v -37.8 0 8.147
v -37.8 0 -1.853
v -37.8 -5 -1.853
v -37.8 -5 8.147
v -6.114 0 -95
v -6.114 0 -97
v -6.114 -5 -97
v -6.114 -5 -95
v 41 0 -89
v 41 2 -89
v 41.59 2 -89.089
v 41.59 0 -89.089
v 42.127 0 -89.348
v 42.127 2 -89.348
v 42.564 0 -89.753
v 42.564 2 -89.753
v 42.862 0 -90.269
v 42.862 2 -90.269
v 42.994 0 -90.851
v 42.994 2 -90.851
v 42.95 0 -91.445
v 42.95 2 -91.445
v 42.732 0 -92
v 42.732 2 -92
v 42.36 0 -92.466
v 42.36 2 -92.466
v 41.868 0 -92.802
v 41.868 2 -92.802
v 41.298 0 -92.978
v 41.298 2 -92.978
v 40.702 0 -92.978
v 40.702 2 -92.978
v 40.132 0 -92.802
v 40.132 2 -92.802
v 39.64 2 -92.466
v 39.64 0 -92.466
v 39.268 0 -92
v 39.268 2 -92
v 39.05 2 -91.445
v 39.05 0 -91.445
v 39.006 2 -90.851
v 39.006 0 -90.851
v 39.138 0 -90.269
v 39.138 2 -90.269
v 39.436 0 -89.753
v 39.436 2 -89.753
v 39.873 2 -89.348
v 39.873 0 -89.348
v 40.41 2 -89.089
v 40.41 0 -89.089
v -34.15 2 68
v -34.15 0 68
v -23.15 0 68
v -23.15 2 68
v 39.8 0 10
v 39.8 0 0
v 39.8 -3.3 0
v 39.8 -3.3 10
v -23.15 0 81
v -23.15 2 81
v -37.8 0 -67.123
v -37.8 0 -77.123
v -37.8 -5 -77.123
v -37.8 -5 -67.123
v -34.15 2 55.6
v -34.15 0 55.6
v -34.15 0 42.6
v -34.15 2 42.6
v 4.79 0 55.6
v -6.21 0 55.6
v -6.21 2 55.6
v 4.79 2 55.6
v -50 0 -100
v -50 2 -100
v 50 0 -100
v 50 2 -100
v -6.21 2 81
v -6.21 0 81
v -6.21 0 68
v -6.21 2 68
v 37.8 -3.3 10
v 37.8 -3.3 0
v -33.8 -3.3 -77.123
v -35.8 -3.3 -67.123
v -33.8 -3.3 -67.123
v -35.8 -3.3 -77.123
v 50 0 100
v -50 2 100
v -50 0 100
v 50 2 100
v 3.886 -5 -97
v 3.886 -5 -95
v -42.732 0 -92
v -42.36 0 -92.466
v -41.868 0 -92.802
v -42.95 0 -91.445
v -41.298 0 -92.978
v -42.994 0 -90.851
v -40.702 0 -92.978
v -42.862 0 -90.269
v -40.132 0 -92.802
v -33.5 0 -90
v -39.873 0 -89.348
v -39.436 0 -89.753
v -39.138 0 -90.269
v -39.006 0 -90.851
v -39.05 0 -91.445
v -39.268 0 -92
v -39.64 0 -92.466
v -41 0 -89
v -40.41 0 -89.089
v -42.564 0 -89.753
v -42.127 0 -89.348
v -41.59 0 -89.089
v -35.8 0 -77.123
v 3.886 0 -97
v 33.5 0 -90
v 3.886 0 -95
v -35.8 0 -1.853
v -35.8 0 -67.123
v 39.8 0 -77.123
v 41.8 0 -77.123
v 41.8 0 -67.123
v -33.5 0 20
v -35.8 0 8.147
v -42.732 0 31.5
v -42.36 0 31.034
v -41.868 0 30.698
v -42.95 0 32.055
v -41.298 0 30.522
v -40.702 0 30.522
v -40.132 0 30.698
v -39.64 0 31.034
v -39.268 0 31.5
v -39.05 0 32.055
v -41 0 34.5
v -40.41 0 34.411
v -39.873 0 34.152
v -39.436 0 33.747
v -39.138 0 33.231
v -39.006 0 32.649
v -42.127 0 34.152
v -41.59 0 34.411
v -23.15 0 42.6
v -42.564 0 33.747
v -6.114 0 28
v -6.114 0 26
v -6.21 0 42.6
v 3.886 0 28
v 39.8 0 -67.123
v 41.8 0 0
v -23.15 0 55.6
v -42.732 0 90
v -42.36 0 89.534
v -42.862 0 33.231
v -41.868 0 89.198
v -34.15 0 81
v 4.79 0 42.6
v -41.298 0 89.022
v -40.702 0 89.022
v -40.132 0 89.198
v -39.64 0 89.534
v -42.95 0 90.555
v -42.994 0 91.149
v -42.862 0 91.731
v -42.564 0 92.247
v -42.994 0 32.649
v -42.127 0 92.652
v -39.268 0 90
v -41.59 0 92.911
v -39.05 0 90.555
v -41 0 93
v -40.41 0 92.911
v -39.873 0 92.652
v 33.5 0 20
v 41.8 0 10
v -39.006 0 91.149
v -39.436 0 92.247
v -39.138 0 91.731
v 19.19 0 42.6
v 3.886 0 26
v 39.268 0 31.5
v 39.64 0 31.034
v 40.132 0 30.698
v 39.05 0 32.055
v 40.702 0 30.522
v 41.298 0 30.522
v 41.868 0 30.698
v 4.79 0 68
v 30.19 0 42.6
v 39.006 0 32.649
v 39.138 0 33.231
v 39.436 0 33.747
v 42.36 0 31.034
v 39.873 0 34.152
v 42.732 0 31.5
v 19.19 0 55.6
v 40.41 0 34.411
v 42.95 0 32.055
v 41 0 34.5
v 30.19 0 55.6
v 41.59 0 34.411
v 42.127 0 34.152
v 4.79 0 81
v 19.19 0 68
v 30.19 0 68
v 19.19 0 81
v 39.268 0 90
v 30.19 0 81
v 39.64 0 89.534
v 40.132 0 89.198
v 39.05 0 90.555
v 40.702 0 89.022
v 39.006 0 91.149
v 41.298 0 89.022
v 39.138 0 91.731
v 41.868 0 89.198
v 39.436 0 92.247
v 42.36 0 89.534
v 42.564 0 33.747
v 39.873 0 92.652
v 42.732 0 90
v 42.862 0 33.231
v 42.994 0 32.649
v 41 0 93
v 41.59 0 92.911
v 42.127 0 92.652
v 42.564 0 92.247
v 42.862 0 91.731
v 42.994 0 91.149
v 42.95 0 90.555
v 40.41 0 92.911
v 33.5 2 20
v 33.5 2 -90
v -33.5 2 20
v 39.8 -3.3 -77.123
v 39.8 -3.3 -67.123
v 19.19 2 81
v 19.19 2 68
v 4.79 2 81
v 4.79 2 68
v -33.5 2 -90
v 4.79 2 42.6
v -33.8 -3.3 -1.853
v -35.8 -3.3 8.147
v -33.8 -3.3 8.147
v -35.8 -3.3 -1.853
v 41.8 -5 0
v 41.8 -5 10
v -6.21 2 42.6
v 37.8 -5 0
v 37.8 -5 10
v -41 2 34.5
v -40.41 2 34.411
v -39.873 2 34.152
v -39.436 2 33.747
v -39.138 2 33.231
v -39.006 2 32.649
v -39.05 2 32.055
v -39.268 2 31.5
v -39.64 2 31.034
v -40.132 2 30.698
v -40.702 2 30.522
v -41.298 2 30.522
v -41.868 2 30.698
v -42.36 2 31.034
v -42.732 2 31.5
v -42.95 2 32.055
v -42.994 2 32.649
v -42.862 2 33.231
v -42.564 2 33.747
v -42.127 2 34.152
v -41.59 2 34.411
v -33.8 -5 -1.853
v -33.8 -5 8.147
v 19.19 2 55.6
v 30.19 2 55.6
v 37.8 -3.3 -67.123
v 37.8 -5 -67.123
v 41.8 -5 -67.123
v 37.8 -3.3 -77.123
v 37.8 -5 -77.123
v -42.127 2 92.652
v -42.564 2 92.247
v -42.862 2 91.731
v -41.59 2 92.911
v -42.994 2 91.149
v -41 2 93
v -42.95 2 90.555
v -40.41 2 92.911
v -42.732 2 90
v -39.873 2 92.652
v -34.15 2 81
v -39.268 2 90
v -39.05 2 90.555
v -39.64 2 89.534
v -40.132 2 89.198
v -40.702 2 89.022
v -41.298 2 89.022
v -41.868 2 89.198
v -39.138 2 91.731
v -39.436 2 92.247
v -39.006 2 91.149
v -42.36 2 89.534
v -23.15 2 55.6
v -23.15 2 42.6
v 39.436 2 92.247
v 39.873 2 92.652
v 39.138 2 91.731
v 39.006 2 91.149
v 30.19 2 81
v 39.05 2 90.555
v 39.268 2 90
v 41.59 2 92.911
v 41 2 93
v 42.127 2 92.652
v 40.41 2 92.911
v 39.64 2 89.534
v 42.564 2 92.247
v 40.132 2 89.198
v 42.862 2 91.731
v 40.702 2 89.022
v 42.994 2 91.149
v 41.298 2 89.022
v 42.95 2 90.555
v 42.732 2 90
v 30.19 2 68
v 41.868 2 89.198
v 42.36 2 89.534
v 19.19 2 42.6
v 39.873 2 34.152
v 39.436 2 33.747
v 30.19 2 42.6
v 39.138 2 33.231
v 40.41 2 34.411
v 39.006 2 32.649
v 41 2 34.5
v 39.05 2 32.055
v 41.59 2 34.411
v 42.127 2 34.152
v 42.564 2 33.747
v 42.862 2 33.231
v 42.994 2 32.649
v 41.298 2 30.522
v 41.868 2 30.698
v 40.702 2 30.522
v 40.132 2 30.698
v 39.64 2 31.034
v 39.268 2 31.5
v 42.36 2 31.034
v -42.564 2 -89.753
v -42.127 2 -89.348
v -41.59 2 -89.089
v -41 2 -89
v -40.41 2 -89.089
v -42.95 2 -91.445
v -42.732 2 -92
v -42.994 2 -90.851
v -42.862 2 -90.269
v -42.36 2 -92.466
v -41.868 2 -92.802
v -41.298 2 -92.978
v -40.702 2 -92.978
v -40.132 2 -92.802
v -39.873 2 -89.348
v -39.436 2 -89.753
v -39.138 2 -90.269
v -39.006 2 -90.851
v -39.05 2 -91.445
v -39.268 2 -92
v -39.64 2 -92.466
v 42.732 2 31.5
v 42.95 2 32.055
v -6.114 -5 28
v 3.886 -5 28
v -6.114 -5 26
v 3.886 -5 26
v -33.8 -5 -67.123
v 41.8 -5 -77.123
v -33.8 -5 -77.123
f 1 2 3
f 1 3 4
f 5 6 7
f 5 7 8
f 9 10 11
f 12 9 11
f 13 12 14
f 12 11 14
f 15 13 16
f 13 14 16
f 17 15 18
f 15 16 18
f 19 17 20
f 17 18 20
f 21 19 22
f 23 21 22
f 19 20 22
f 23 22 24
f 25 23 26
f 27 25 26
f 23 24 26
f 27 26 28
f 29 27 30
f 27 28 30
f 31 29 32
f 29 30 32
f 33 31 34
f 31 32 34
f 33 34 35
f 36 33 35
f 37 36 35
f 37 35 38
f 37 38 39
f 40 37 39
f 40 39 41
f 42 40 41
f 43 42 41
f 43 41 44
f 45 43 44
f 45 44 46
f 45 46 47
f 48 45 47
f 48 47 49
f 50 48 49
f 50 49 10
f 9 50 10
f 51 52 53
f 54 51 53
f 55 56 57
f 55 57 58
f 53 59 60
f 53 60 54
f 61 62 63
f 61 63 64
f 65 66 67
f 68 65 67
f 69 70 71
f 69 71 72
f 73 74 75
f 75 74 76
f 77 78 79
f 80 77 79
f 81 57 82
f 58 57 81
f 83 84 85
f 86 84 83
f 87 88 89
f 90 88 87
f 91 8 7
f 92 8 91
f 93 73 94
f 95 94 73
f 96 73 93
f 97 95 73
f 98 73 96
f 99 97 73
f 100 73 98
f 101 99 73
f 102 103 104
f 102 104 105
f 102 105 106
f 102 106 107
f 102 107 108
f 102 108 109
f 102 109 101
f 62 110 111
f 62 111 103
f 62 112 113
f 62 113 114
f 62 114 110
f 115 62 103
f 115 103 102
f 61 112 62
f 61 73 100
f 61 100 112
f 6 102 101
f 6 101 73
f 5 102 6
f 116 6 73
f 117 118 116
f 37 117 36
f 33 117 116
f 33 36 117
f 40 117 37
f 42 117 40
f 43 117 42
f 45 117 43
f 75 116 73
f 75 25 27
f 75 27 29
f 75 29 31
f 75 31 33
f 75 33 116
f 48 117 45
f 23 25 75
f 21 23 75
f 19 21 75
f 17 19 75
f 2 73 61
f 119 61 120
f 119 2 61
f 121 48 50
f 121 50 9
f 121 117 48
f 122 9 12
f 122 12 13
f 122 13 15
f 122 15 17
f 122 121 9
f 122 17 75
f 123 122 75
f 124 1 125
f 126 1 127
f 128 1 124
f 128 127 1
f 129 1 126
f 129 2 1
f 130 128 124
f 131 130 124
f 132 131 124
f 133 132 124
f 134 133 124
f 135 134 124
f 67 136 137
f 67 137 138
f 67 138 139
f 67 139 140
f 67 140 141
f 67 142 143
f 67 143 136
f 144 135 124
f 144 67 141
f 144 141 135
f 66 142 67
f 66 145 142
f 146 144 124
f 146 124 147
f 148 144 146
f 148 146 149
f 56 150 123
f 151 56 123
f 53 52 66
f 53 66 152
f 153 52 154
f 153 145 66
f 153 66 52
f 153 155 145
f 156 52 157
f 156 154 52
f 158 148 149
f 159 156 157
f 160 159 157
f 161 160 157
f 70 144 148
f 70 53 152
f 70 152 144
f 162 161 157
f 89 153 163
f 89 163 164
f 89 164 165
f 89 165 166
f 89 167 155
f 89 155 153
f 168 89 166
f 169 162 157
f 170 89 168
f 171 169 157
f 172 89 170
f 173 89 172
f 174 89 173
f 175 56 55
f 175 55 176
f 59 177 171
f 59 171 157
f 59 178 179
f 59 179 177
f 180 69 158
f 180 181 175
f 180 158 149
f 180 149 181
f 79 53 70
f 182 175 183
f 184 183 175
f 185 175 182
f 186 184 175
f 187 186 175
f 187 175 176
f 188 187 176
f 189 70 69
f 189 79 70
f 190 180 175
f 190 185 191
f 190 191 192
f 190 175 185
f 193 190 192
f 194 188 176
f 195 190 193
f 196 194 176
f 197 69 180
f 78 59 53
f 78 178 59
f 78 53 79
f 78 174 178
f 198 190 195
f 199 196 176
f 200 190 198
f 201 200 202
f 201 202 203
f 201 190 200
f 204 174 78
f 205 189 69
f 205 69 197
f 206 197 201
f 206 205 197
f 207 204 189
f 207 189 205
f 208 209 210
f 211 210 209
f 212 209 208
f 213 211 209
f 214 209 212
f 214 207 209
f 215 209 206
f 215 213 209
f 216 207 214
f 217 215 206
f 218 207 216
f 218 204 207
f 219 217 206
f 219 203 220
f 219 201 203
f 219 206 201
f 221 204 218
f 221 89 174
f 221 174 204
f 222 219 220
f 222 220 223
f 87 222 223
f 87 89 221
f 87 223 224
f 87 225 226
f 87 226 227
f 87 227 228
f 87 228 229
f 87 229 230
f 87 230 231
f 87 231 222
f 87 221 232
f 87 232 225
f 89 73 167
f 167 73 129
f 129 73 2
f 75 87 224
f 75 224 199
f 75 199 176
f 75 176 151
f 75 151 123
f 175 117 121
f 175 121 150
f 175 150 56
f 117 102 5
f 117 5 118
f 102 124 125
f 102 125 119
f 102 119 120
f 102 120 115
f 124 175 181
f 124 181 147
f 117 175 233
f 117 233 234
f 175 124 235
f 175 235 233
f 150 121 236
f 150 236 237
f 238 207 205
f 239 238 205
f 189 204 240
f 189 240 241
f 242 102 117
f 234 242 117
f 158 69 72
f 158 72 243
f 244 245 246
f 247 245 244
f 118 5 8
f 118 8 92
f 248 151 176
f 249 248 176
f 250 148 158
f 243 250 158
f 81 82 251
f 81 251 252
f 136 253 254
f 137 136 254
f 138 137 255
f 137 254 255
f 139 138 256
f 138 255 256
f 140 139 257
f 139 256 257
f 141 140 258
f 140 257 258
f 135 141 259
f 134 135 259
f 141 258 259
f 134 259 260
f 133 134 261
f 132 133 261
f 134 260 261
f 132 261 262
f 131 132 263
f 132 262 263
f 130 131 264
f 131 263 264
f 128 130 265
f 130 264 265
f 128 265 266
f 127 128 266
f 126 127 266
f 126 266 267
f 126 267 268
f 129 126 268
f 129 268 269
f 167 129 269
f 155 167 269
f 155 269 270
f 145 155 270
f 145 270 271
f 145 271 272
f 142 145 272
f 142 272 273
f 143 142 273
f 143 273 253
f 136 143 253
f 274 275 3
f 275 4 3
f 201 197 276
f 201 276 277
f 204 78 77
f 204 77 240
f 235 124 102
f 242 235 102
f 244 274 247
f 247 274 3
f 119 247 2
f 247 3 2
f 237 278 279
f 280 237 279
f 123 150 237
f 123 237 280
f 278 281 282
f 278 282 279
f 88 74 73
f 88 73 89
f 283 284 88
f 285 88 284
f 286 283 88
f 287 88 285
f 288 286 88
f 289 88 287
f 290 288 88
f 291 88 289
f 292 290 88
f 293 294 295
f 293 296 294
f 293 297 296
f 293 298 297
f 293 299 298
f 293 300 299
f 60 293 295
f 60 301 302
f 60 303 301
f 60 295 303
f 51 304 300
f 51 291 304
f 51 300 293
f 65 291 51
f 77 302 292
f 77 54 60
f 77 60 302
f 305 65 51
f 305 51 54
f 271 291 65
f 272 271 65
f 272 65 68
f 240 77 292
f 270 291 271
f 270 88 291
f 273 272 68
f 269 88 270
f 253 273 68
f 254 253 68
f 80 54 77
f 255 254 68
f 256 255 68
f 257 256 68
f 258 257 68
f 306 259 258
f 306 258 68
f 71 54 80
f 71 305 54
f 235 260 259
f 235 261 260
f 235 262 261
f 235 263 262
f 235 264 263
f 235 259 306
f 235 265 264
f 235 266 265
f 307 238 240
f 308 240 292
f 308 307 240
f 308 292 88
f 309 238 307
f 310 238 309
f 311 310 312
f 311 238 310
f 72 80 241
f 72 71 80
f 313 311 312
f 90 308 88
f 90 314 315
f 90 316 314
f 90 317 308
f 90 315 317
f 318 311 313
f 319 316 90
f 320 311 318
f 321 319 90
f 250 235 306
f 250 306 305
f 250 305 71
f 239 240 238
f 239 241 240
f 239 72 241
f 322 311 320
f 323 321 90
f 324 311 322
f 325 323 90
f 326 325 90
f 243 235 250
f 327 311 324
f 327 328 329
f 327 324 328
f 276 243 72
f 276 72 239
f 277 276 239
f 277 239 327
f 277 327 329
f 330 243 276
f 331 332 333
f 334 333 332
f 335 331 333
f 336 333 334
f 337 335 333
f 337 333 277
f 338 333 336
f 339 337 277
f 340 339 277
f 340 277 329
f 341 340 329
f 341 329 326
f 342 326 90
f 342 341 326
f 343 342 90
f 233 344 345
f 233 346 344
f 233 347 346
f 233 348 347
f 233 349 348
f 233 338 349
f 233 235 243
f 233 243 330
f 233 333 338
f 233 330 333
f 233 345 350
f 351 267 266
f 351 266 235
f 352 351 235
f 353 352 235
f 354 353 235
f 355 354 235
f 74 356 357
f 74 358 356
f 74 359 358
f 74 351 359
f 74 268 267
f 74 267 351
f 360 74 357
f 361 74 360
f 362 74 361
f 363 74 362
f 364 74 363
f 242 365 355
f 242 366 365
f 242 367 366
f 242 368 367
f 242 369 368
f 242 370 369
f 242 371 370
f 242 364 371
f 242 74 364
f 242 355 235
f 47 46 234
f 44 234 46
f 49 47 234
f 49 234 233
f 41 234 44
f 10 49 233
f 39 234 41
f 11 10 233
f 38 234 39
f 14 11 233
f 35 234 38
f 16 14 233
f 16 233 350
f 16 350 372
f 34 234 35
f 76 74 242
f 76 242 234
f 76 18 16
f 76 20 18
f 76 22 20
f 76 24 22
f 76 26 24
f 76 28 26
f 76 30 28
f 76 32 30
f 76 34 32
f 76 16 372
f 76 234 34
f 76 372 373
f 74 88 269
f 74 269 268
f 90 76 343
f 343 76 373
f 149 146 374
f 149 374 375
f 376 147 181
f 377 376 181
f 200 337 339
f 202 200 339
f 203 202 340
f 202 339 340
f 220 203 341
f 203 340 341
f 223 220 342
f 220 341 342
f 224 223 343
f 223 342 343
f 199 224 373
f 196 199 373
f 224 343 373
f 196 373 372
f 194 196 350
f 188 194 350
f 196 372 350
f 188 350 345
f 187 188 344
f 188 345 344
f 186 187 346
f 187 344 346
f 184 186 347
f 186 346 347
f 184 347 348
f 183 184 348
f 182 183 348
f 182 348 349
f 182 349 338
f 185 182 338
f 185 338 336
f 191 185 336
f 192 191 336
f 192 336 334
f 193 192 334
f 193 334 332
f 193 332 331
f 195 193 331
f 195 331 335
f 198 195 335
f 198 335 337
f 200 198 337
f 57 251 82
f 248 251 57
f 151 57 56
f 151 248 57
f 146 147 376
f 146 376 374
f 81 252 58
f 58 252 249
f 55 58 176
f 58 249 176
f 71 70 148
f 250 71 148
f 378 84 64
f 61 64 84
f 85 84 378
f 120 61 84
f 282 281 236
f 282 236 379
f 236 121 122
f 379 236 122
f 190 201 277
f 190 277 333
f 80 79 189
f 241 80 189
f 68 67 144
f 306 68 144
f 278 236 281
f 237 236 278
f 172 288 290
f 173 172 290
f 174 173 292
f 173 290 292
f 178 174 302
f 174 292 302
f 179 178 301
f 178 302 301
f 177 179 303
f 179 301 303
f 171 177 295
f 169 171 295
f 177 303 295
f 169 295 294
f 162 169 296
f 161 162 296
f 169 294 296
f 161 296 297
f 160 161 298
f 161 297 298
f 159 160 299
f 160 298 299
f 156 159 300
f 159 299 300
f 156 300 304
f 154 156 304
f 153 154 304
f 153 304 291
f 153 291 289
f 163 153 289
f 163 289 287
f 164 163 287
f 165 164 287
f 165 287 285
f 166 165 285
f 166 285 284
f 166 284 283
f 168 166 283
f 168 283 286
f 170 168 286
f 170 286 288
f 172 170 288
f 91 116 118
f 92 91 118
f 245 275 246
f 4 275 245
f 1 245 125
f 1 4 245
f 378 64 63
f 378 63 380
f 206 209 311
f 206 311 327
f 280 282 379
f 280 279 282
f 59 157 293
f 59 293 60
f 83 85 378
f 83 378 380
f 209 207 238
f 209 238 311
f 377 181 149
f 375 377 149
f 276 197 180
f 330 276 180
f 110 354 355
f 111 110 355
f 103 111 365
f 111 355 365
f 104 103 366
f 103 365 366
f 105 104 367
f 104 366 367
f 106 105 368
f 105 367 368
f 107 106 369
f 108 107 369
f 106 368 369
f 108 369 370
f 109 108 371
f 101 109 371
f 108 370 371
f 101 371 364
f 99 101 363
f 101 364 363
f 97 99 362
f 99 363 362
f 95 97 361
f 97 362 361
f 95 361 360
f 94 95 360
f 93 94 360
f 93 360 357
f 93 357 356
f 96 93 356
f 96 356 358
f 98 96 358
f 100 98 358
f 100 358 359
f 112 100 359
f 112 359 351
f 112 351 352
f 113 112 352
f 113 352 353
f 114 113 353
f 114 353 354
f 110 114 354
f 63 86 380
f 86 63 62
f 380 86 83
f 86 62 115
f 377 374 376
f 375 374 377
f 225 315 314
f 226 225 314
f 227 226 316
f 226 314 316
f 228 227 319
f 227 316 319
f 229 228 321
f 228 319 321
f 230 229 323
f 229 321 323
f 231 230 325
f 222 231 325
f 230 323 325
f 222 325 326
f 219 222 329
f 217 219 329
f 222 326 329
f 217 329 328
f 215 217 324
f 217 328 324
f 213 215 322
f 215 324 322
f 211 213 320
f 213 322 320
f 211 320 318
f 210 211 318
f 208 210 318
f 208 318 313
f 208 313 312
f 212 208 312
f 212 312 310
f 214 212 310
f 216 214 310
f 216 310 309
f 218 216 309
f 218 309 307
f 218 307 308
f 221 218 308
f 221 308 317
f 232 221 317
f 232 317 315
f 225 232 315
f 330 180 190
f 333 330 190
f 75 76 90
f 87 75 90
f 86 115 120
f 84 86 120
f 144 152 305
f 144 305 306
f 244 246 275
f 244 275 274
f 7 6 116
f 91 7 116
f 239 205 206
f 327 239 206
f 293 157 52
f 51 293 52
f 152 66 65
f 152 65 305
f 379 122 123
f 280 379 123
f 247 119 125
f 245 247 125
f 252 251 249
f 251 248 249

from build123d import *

# Parameters (mm, degrees)
SKETCH1_W           = 100
SKETCH1_H           = 200
SKETCH1_W_2         = 67
SKETCH1_H_2         = 110
BOSS_EXTRUDE1_DEPTH = 2
SKETCH2_W           = 100
SKETCH2_H           = 200
SKETCH2_W_2         = 94
SKETCH2_H_2         = 194
BOSS_EXTRUDE2_DEPTH = 16.4
SKETCH3_R           = 1.15
BOSS_EXTRUDE3_DEPTH = 2
BOSS_EXTRUDE4_DEPTH = 25
SKETCH8_W           = 100
SKETCH8_H           = 110
BOSS_EXTRUDE5_DEPTH = 3
SKETCH9_W           = 11
SKETCH9_H           = 13
CUT_EXTRUDE2_DEPTH  = 36
SKETCH10_W          = 7
SKETCH10_H          = 3
CUT_EXTRUDE3_DEPTH  = 10
SKETCH11_W          = 3
SKETCH11_H          = 7
CUT_EXTRUDE4_DEPTH  = 10
SKETCH12_W          = 100
SKETCH12_H          = 17.4
CUT_EXTRUDE5_DEPTH  = 3
SKETCH13_W          = 146.237469439
SKETCH13_H          = 217.9364229
CUT_EXTRUDE6_DEPTH  = 57
SKETCH14_R          = 2
CUT_EXTRUDE7_DEPTH  = 57
SKETCH15_W          = 2
SKETCH15_H          = 10
SKETCH15_W_2        = 10
SKETCH15_H_2        = 2
BOSS_EXTRUDE6_DEPTH = 5
SKETCH16_W          = 10
SKETCH16_H          = 1.7
BOSS_EXTRUDE7_DEPTH = 2
SKETCH17_W          = 10
SKETCH17_H          = 1.7
BOSS_EXTRUDE8_DEPTH = 2


with BuildPart() as part:
    # Sketch1 → Boss-Extrude1 (new body)
    with BuildSketch(Plane(origin=(0, 0, 0), x_dir=(1, 0, 0), z_dir=(0, 1, 0))):
        Rectangle(SKETCH1_W, SKETCH1_H)
        with Locations((0, 35)):
            Rectangle(SKETCH1_W_2, SKETCH1_H_2, mode=Mode.SUBTRACT)
    extrude(amount=BOSS_EXTRUDE1_DEPTH)

    # Sketch2 → Boss-Extrude2 (add)
    with BuildSketch(Plane.XZ):
        Rectangle(SKETCH2_W, SKETCH2_H)
        Rectangle(SKETCH2_W_2, SKETCH2_H_2, mode=Mode.SUBTRACT)
    extrude(amount=BOSS_EXTRUDE2_DEPTH)

    # Sketch3 → Boss-Extrude3 (add)
    with BuildSketch(Plane.XZ.offset(16.4)):
        Polygon((-50, 100), (50, 100), (50, 10), (50, -9), (30, -9), (30, 1), (35, 1), (35, 10), (35, 80), (-35, 80), (-35, 10), (-35, 1), (-30, 1), (-30, -9), (-50, -9), (-50, 10), align=None)
        with Locations(Location((-35, 85, 0), (0, 0, 270))):
            Circle(SKETCH3_R, mode=Mode.SUBTRACT)
        with Locations(Location((35, 85, 0), (0, 0, 270))):
            Circle(SKETCH3_R, mode=Mode.SUBTRACT)
        with Locations(Location((-35, -4, 0), (0, 0, 270))):
            Circle(SKETCH3_R, mode=Mode.SUBTRACT)
        with Locations(Location((35, -4, 0), (0, 0, 270))):
            Circle(SKETCH3_R, mode=Mode.SUBTRACT)
    extrude(amount=BOSS_EXTRUDE3_DEPTH)

    # Sketch5 → Boss-Extrude4 (add)
    with BuildSketch(Plane.XZ.offset(16.4)):
        Polygon((-50, -100), (50, -100), (50, -97), (50, 10), (47, 10), (47, -97), (-47, -97), (-47, 10), (-50, 10), (-50, -97), align=None)
    extrude(amount=BOSS_EXTRUDE4_DEPTH)

    # Sketch8 → Boss-Extrude5 (add)
    with BuildSketch(Plane.XZ.offset(41.4)):
        with Locations((0, -45)):
            Rectangle(SKETCH8_W, SKETCH8_H)
    extrude(amount=BOSS_EXTRUDE5_DEPTH)

    # Sketch9 → Cut-Extrude2 (cut)
    with BuildSketch(Plane(origin=(0, -16.4, 0), x_dir=(1, 0, 0), z_dir=(0, 1, 0))):
        with Locations((-28.65, -74.5)):
            Rectangle(SKETCH9_W, SKETCH9_H)
        with Locations((-0.71, -74.5)):
            Rectangle(SKETCH9_W, SKETCH9_H)
        with Locations((24.69, -74.5)):
            Rectangle(SKETCH9_W, SKETCH9_H)
        with Locations((-28.65, -49.1)):
            Rectangle(SKETCH9_W, SKETCH9_H)
        with Locations((-0.71, -49.1)):
            Rectangle(SKETCH9_W, SKETCH9_H)
        with Locations((24.69, -49.1)):
            Rectangle(SKETCH9_W, SKETCH9_H)
    extrude(amount=CUT_EXTRUDE2_DEPTH, mode=Mode.SUBTRACT)

    # Sketch10 → Cut-Extrude3 (cut)
    with BuildSketch(Plane.XZ.offset(44.4)):
        with Locations((-39.5, 5)):
            Rectangle(SKETCH10_W, SKETCH10_H)
        with Locations((39.5, 5)):
            Rectangle(SKETCH10_W, SKETCH10_H)
    extrude(amount=-CUT_EXTRUDE3_DEPTH, mode=Mode.SUBTRACT)

    # Sketch11 → Cut-Extrude4 (cut)
    with BuildSketch(Plane.XZ.offset(18.4)):
        with Locations((-45, 91.5)):
            Rectangle(SKETCH11_W, SKETCH11_H)
        with Locations((45, 91.5)):
            Rectangle(SKETCH11_W, SKETCH11_H)
    extrude(amount=-CUT_EXTRUDE4_DEPTH, mode=Mode.SUBTRACT)

    # Sketch12 → Cut-Extrude5 (cut)
    with BuildSketch(Plane.XY.offset(100)):
        with Locations((0, -9.7)):
            Rectangle(SKETCH12_W, SKETCH12_H)
    extrude(amount=-CUT_EXTRUDE5_DEPTH, mode=Mode.SUBTRACT)

    # Sketch13 → Cut-Extrude6 (cut)
    with BuildSketch(Plane.XZ):
        with Locations((11.358250054, -1.301466152)):
            Rectangle(SKETCH13_W, SKETCH13_H)
    extrude(amount=CUT_EXTRUDE6_DEPTH, mode=Mode.SUBTRACT)

    # Sketch14 → Cut-Extrude7 (cut)
    with BuildSketch(Plane(origin=(0, 2, 0), x_dir=(1, 0, 0), z_dir=(0, 1, 0))):
        with Locations(Location((-41, -91, 0), (0, 0, 270))):
            Circle(SKETCH14_R)
        with Locations(Location((41, -91, 0), (0, 0, 270))):
            Circle(SKETCH14_R)
        with Locations(Location((41, -32.5, 0), (0, 0, 270))):
            Circle(SKETCH14_R)
        with Locations(Location((-41, -32.5, 0), (0, 0, 270))):
            Circle(SKETCH14_R)
        with Locations(Location((-41, 91, 0), (0, 0, 270))):
            Circle(SKETCH14_R)
        with Locations(Location((41, 91, 0), (0, 0, 270))):
            Circle(SKETCH14_R)
    extrude(amount=-CUT_EXTRUDE7_DEPTH, mode=Mode.SUBTRACT)

    # Sketch15 → Boss-Extrude6 (add)
    with BuildSketch(Plane.XZ):
        with Locations((-36.8, 3.147463841)):
            Rectangle(SKETCH15_W, SKETCH15_H)
        with Locations((-36.8, -72.12250392)):
            Rectangle(SKETCH15_W, SKETCH15_H)
        with Locations((40.8, 5)):
            Rectangle(SKETCH15_W, SKETCH15_H)
        with Locations((40.8, -72.12250392)):
            Rectangle(SKETCH15_W, SKETCH15_H)
        with Locations((-1.11415266, -96)):
            Rectangle(SKETCH15_W_2, SKETCH15_H_2)
        with Locations((-1.11415266, 27)):
            Rectangle(SKETCH15_W_2, SKETCH15_H_2)
    extrude(amount=BOSS_EXTRUDE6_DEPTH)

    # Sketch16 → Boss-Extrude7 (add)
    with BuildSketch(Plane(origin=(-35.8, 0, 0), x_dir=(0, 0, -1), z_dir=(1, 0, 0))):
        with Locations((-3.147463841, -4.15)):
            Rectangle(SKETCH16_W, SKETCH16_H)
        with Locations((72.12250392, -4.15)):
            Rectangle(SKETCH16_W, SKETCH16_H)
    extrude(amount=BOSS_EXTRUDE7_DEPTH)

    # Sketch17 → Boss-Extrude8 (add)
    with BuildSketch(Plane.ZY.offset(-39.8)):
        with Locations((5, -4.15)):
            Rectangle(SKETCH17_W, SKETCH17_H)
        with Locations((-72.12250392, -4.15)):
            Rectangle(SKETCH17_W, SKETCH17_H)
    extrude(amount=BOSS_EXTRUDE8_DEPTH)


solid = part.part
